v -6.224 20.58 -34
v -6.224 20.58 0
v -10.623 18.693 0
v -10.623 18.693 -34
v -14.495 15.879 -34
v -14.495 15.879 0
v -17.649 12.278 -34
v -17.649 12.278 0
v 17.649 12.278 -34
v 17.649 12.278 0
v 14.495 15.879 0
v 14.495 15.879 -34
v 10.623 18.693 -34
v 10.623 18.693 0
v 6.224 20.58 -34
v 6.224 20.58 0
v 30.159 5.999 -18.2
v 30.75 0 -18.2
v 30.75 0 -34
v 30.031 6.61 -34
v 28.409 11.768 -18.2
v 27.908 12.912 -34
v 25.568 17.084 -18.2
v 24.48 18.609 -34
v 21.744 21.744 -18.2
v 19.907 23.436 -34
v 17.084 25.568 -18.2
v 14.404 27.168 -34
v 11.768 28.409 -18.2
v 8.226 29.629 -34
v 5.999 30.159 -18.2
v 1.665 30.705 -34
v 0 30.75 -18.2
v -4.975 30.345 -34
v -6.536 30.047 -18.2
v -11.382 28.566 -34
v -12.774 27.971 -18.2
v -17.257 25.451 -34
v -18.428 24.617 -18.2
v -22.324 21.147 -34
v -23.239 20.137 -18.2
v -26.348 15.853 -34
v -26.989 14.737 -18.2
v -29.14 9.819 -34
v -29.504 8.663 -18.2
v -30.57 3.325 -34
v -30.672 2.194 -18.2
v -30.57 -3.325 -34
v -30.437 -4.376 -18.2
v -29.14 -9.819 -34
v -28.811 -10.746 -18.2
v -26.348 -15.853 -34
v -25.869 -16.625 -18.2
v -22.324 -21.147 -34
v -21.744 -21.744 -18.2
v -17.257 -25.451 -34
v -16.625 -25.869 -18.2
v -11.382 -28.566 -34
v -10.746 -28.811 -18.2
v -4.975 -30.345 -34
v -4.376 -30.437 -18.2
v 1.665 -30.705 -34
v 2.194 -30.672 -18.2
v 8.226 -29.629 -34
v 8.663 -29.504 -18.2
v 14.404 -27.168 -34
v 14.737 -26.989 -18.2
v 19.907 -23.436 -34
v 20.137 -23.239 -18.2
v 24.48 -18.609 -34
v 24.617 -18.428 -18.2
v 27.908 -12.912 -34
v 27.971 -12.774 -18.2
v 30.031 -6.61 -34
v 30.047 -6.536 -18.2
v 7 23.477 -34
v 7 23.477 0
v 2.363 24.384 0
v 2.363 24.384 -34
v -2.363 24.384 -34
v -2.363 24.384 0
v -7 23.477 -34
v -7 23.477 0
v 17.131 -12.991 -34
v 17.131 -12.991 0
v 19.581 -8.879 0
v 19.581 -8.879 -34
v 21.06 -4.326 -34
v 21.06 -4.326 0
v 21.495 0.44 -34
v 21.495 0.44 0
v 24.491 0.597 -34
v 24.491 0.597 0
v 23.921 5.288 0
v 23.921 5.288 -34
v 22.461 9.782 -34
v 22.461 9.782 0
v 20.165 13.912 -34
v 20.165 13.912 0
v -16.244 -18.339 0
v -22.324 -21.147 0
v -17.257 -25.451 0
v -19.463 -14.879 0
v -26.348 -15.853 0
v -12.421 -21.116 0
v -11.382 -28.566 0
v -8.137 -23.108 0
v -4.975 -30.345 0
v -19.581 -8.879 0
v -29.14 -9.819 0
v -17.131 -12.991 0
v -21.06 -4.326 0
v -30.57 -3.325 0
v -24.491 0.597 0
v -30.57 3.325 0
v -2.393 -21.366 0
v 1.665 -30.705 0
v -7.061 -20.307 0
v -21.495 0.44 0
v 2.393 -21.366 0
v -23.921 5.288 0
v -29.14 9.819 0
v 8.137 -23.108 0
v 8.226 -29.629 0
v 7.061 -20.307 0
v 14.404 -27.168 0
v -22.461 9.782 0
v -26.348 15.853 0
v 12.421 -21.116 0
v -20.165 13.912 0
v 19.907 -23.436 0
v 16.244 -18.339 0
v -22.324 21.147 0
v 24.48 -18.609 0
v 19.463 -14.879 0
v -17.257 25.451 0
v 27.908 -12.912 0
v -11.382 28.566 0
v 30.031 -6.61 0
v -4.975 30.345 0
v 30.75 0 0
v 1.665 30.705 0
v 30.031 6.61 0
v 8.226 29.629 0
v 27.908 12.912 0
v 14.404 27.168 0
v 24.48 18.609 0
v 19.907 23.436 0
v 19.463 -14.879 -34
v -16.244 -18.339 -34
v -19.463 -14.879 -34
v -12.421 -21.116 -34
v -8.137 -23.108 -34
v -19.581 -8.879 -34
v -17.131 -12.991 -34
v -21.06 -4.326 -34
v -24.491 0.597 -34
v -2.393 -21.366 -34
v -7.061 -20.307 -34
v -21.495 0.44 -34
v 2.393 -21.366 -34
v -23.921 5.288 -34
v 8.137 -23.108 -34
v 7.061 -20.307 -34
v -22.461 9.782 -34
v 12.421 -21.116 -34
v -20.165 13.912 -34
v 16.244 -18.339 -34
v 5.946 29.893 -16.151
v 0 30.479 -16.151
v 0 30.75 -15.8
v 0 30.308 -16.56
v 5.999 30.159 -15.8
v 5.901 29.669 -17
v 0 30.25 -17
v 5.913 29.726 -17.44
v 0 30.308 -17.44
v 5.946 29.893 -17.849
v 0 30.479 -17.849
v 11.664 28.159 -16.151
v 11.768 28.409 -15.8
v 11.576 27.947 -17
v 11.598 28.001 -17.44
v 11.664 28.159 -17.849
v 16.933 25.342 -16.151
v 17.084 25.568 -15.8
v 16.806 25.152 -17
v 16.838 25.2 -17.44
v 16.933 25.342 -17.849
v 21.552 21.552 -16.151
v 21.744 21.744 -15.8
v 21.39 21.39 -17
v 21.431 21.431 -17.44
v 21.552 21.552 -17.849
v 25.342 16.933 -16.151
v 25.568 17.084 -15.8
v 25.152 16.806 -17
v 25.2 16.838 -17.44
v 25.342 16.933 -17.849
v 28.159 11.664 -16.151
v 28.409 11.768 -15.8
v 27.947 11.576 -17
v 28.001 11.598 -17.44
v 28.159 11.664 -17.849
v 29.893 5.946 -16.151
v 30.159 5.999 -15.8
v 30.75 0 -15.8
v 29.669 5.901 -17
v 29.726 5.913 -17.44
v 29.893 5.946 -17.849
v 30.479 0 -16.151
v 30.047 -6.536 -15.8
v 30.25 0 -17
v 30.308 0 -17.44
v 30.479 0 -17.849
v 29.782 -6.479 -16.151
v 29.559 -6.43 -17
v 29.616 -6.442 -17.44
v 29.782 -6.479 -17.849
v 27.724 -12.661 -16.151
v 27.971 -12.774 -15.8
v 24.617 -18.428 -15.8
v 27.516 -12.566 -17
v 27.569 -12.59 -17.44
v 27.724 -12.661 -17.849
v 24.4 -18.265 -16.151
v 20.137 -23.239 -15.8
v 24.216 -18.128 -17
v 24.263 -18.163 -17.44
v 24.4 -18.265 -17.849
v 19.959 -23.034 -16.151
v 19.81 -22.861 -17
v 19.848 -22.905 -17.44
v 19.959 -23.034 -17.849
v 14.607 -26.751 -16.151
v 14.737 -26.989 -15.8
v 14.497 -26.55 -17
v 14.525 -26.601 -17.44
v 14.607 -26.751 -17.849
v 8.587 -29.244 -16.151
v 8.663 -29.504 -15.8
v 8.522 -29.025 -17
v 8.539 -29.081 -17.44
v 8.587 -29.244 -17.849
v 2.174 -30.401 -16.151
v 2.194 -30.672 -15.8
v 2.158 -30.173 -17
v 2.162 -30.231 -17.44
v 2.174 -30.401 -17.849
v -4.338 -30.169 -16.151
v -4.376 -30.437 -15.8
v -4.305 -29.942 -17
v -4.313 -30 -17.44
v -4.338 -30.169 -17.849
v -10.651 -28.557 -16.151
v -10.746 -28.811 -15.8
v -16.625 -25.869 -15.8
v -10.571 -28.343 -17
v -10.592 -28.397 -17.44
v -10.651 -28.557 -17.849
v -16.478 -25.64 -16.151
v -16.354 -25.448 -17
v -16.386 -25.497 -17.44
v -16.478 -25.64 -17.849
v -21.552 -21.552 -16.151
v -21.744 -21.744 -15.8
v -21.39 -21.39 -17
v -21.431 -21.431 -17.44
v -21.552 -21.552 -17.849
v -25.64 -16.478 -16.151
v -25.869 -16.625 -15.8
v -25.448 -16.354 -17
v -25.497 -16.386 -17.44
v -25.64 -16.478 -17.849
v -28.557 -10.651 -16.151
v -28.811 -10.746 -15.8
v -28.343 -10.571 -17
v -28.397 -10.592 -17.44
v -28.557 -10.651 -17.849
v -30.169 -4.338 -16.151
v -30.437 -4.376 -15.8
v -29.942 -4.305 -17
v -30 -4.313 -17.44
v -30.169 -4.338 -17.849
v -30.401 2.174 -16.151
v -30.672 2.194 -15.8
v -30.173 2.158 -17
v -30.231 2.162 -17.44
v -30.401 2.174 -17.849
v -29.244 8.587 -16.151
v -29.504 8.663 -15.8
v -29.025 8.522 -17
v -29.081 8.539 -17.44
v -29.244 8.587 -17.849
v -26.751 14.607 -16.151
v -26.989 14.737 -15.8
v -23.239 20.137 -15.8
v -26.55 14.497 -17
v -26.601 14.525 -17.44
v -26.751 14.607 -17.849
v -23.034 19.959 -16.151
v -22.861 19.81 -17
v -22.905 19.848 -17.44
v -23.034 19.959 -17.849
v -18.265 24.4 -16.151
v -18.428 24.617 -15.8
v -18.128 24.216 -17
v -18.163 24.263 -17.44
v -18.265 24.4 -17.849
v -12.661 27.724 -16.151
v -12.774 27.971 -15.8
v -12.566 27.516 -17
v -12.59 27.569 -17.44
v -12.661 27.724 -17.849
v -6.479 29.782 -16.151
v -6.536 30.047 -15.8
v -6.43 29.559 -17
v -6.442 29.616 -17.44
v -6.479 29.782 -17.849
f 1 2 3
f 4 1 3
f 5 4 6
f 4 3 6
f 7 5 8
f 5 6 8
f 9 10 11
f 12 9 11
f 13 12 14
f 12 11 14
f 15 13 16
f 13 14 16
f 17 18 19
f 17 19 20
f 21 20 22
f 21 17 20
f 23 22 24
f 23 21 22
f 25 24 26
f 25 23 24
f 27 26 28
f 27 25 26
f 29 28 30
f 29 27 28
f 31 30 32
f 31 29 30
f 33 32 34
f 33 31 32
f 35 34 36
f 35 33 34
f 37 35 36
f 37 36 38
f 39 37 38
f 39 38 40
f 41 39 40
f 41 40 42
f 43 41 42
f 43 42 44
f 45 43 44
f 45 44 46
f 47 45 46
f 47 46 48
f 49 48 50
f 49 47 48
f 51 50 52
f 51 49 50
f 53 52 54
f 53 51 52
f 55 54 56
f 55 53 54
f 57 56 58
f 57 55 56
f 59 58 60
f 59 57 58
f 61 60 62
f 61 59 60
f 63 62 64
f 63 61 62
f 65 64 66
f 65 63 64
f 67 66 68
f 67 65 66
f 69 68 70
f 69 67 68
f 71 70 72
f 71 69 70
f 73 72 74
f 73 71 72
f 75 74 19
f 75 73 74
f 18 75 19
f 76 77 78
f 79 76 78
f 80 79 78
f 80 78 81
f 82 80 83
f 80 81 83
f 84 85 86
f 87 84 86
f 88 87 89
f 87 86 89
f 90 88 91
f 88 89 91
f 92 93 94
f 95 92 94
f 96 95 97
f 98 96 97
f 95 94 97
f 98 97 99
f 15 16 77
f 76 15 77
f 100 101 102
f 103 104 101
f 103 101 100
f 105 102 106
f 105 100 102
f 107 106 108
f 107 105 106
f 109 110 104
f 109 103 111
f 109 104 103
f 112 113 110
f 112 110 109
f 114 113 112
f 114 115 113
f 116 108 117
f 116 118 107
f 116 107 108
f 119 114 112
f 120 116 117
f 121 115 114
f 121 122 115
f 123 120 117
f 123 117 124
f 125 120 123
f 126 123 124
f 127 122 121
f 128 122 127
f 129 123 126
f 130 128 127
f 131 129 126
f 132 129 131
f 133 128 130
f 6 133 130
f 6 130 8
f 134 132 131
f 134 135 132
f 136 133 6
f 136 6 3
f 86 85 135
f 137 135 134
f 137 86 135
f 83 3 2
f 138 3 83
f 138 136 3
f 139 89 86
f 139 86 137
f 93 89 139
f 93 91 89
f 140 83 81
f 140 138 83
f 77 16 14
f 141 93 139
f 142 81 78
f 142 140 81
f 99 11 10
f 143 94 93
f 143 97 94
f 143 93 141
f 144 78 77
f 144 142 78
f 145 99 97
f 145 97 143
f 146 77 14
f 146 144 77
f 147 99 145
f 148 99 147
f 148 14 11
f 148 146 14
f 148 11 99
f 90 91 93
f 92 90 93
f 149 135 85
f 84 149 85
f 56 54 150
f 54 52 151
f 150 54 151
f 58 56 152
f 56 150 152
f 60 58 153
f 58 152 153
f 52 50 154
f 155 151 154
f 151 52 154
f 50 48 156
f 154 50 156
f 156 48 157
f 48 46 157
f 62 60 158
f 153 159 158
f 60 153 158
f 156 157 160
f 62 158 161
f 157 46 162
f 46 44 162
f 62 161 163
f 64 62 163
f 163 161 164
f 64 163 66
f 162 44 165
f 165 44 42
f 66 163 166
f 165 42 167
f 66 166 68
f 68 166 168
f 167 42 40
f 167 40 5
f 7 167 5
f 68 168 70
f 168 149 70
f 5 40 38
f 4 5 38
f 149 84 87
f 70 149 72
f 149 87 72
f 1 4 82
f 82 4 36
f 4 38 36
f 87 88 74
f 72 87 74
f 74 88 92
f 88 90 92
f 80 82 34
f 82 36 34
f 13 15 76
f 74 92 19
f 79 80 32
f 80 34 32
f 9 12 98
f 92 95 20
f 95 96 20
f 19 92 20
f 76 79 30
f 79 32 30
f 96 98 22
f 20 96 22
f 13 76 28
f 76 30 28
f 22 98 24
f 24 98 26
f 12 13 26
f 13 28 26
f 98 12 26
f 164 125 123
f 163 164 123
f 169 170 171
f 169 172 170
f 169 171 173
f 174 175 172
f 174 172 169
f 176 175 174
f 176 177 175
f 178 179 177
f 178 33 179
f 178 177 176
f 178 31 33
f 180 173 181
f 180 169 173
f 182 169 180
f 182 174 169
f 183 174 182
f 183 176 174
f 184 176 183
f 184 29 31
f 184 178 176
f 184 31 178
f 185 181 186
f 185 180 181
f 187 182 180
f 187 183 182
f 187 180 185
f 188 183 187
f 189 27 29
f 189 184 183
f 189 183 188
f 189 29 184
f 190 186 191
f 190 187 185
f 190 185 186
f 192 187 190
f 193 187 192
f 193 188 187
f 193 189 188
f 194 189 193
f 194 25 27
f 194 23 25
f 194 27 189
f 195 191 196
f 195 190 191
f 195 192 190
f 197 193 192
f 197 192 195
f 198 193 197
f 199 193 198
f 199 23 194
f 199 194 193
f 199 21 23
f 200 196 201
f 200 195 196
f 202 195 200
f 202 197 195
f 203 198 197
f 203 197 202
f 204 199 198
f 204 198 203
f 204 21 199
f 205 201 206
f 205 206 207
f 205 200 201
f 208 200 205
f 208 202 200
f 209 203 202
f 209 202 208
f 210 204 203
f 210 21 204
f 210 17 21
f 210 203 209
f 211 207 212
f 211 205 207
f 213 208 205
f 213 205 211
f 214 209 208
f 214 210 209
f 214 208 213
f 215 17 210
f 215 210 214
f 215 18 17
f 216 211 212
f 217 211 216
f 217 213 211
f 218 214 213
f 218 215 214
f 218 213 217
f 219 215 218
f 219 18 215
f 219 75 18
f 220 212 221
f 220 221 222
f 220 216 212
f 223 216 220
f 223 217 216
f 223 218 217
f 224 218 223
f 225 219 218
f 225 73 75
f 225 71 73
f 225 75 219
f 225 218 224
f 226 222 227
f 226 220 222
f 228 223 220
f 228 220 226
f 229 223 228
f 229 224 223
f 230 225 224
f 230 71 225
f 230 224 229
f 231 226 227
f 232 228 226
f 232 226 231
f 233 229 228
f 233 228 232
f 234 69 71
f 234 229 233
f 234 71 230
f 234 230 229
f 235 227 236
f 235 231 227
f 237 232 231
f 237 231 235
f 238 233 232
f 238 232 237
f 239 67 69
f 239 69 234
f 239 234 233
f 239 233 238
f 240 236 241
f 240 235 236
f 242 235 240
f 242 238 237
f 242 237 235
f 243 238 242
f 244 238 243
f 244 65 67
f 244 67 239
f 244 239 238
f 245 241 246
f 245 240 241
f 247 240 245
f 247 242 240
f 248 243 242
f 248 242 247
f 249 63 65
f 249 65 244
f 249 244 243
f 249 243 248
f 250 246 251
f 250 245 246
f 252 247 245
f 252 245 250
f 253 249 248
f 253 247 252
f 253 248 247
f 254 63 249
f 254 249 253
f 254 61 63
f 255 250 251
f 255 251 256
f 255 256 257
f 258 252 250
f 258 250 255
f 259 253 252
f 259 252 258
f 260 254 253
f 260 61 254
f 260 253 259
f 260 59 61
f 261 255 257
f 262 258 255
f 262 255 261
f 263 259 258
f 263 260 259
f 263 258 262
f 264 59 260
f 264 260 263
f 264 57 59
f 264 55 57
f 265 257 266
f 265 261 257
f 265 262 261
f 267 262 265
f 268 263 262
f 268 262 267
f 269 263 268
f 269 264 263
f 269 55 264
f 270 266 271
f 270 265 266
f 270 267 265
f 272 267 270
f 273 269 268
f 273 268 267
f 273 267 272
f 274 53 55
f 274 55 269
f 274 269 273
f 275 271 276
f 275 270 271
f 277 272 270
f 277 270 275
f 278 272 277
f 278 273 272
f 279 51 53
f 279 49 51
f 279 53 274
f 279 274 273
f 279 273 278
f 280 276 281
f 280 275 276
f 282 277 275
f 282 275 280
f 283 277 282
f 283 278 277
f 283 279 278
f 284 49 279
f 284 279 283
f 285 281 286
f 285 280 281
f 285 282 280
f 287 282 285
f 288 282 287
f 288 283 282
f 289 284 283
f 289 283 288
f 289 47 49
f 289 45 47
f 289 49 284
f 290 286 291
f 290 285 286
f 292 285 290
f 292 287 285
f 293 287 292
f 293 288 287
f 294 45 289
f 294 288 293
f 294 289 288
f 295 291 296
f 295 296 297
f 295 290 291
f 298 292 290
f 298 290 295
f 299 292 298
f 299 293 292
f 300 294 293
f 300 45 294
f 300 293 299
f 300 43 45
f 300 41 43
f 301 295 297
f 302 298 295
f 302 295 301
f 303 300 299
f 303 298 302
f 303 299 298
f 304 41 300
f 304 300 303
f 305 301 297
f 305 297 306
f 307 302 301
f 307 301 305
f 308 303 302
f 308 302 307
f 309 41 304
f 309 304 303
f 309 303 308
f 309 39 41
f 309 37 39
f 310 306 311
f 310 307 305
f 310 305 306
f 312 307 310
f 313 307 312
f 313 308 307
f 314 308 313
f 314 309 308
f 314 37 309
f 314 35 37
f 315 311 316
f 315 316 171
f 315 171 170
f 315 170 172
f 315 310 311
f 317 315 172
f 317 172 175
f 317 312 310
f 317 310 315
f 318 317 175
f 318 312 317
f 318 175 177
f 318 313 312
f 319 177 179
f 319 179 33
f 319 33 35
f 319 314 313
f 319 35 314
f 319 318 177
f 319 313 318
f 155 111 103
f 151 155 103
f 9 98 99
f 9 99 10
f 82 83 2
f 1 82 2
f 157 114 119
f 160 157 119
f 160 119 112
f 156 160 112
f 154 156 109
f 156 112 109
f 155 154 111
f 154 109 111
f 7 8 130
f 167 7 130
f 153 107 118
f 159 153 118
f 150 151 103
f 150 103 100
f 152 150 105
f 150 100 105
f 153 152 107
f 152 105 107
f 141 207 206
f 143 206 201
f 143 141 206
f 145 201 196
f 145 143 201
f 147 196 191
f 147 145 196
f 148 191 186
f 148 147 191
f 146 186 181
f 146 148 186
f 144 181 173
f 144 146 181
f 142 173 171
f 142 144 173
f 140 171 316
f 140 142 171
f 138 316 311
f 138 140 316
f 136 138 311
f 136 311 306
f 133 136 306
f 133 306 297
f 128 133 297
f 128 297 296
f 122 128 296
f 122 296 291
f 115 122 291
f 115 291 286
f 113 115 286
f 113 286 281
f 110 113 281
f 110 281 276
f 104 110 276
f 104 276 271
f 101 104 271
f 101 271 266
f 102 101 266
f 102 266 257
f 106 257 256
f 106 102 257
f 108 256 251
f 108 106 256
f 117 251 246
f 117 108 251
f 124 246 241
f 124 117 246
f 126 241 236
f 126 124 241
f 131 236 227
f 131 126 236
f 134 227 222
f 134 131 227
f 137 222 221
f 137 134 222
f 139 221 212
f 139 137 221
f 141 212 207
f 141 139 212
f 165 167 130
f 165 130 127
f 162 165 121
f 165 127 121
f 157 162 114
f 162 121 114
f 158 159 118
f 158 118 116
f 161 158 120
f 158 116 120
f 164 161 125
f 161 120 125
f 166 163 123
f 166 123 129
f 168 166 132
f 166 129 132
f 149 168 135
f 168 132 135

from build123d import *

# Parameters (mm, degrees)
SKETCH1_R           = 30.75
BOSS_EXTRUDE1_DEPTH = 34


with BuildPart() as part:
    # Sketch1 → Boss-Extrude1 (new body)
    with BuildSketch(Plane.XY):
        Circle(SKETCH1_R)
        with BuildLine():
            Line((-17.649126209, 12.27836895), (-20.165137913, 13.912286055))
            ThreePointArc((-20.165137913, 13.912286055), (-23.299613116, 7.570503216), (-24.491375834, 0.597494827))
            Line((-24.491375834, 0.597494827), (-21.49548723, 0.440486958))
            ThreePointArc((-21.49548723, 0.440486958), (-20.4477151, -6.643865379), (-17.131302733, -12.991091819))
            Line((-17.131302733, -12.991091819), (-19.462740618, -14.879052992))
            ThreePointArc((-19.462740618, -14.879052992), (-14.39995283, -19.819834732), (-8.136502697, -23.108046524))
            Line((-8.136502697, -23.108046524), (-7.061398848, -20.307305245))
            ThreePointArc((-7.061398848, -20.307305245), (0, -21.5), (7.061398848, -20.307305245))
            Line((7.061398848, -20.307305245), (8.136502697, -23.108046524))
            ThreePointArc((8.136502697, -23.108046524), (14.39995283, -19.819834732), (19.462740618, -14.879052992))
            Line((19.462740618, -14.879052992), (17.131302733, -12.991091819))
            ThreePointArc((17.131302733, -12.991091819), (20.4477151, -6.643865379), (21.49548723, 0.440486958))
            Line((21.49548723, 0.440486958), (24.491375834, 0.597494827))
            ThreePointArc((24.491375834, 0.597494827), (23.299613116, 7.570503216), (20.165137913, 13.912286055))
            Line((20.165137913, 13.912286055), (17.649126209, 12.27836895))
            ThreePointArc((17.649126209, 12.27836895), (12.637382924, 17.393865379), (6.223542865, 20.579541156))
            Line((6.223542865, 20.579541156), (7, 23.477318635))
            ThreePointArc((7, 23.477318635), (0, 24.498663031), (-7, 23.477318635))
            Line((-7, 23.477318635), (-6.223542865, 20.579541156))
            ThreePointArc((-6.223542865, 20.579541156), (-12.637382924, 17.393865379), (-17.649126209, 12.27836895))
        make_face(mode=Mode.SUBTRACT)
    extrude(amount=-BOSS_EXTRUDE1_DEPTH)

    # Sketch2 → Cut-Revolve1 (revolve, cut)
    with BuildSketch(Plane.ZY):
        with BuildLine():
            Line((-18.2, 30.75), (-15.8, 30.75))
            ThreePointArc((-15.8, 30.75), (-17, 30.25), (-18.2, 30.75))
        make_face()
    revolve(axis=Axis((0, 0, 27.953503857), (0, 0, -1)), mode=Mode.SUBTRACT)


solid = part.part
